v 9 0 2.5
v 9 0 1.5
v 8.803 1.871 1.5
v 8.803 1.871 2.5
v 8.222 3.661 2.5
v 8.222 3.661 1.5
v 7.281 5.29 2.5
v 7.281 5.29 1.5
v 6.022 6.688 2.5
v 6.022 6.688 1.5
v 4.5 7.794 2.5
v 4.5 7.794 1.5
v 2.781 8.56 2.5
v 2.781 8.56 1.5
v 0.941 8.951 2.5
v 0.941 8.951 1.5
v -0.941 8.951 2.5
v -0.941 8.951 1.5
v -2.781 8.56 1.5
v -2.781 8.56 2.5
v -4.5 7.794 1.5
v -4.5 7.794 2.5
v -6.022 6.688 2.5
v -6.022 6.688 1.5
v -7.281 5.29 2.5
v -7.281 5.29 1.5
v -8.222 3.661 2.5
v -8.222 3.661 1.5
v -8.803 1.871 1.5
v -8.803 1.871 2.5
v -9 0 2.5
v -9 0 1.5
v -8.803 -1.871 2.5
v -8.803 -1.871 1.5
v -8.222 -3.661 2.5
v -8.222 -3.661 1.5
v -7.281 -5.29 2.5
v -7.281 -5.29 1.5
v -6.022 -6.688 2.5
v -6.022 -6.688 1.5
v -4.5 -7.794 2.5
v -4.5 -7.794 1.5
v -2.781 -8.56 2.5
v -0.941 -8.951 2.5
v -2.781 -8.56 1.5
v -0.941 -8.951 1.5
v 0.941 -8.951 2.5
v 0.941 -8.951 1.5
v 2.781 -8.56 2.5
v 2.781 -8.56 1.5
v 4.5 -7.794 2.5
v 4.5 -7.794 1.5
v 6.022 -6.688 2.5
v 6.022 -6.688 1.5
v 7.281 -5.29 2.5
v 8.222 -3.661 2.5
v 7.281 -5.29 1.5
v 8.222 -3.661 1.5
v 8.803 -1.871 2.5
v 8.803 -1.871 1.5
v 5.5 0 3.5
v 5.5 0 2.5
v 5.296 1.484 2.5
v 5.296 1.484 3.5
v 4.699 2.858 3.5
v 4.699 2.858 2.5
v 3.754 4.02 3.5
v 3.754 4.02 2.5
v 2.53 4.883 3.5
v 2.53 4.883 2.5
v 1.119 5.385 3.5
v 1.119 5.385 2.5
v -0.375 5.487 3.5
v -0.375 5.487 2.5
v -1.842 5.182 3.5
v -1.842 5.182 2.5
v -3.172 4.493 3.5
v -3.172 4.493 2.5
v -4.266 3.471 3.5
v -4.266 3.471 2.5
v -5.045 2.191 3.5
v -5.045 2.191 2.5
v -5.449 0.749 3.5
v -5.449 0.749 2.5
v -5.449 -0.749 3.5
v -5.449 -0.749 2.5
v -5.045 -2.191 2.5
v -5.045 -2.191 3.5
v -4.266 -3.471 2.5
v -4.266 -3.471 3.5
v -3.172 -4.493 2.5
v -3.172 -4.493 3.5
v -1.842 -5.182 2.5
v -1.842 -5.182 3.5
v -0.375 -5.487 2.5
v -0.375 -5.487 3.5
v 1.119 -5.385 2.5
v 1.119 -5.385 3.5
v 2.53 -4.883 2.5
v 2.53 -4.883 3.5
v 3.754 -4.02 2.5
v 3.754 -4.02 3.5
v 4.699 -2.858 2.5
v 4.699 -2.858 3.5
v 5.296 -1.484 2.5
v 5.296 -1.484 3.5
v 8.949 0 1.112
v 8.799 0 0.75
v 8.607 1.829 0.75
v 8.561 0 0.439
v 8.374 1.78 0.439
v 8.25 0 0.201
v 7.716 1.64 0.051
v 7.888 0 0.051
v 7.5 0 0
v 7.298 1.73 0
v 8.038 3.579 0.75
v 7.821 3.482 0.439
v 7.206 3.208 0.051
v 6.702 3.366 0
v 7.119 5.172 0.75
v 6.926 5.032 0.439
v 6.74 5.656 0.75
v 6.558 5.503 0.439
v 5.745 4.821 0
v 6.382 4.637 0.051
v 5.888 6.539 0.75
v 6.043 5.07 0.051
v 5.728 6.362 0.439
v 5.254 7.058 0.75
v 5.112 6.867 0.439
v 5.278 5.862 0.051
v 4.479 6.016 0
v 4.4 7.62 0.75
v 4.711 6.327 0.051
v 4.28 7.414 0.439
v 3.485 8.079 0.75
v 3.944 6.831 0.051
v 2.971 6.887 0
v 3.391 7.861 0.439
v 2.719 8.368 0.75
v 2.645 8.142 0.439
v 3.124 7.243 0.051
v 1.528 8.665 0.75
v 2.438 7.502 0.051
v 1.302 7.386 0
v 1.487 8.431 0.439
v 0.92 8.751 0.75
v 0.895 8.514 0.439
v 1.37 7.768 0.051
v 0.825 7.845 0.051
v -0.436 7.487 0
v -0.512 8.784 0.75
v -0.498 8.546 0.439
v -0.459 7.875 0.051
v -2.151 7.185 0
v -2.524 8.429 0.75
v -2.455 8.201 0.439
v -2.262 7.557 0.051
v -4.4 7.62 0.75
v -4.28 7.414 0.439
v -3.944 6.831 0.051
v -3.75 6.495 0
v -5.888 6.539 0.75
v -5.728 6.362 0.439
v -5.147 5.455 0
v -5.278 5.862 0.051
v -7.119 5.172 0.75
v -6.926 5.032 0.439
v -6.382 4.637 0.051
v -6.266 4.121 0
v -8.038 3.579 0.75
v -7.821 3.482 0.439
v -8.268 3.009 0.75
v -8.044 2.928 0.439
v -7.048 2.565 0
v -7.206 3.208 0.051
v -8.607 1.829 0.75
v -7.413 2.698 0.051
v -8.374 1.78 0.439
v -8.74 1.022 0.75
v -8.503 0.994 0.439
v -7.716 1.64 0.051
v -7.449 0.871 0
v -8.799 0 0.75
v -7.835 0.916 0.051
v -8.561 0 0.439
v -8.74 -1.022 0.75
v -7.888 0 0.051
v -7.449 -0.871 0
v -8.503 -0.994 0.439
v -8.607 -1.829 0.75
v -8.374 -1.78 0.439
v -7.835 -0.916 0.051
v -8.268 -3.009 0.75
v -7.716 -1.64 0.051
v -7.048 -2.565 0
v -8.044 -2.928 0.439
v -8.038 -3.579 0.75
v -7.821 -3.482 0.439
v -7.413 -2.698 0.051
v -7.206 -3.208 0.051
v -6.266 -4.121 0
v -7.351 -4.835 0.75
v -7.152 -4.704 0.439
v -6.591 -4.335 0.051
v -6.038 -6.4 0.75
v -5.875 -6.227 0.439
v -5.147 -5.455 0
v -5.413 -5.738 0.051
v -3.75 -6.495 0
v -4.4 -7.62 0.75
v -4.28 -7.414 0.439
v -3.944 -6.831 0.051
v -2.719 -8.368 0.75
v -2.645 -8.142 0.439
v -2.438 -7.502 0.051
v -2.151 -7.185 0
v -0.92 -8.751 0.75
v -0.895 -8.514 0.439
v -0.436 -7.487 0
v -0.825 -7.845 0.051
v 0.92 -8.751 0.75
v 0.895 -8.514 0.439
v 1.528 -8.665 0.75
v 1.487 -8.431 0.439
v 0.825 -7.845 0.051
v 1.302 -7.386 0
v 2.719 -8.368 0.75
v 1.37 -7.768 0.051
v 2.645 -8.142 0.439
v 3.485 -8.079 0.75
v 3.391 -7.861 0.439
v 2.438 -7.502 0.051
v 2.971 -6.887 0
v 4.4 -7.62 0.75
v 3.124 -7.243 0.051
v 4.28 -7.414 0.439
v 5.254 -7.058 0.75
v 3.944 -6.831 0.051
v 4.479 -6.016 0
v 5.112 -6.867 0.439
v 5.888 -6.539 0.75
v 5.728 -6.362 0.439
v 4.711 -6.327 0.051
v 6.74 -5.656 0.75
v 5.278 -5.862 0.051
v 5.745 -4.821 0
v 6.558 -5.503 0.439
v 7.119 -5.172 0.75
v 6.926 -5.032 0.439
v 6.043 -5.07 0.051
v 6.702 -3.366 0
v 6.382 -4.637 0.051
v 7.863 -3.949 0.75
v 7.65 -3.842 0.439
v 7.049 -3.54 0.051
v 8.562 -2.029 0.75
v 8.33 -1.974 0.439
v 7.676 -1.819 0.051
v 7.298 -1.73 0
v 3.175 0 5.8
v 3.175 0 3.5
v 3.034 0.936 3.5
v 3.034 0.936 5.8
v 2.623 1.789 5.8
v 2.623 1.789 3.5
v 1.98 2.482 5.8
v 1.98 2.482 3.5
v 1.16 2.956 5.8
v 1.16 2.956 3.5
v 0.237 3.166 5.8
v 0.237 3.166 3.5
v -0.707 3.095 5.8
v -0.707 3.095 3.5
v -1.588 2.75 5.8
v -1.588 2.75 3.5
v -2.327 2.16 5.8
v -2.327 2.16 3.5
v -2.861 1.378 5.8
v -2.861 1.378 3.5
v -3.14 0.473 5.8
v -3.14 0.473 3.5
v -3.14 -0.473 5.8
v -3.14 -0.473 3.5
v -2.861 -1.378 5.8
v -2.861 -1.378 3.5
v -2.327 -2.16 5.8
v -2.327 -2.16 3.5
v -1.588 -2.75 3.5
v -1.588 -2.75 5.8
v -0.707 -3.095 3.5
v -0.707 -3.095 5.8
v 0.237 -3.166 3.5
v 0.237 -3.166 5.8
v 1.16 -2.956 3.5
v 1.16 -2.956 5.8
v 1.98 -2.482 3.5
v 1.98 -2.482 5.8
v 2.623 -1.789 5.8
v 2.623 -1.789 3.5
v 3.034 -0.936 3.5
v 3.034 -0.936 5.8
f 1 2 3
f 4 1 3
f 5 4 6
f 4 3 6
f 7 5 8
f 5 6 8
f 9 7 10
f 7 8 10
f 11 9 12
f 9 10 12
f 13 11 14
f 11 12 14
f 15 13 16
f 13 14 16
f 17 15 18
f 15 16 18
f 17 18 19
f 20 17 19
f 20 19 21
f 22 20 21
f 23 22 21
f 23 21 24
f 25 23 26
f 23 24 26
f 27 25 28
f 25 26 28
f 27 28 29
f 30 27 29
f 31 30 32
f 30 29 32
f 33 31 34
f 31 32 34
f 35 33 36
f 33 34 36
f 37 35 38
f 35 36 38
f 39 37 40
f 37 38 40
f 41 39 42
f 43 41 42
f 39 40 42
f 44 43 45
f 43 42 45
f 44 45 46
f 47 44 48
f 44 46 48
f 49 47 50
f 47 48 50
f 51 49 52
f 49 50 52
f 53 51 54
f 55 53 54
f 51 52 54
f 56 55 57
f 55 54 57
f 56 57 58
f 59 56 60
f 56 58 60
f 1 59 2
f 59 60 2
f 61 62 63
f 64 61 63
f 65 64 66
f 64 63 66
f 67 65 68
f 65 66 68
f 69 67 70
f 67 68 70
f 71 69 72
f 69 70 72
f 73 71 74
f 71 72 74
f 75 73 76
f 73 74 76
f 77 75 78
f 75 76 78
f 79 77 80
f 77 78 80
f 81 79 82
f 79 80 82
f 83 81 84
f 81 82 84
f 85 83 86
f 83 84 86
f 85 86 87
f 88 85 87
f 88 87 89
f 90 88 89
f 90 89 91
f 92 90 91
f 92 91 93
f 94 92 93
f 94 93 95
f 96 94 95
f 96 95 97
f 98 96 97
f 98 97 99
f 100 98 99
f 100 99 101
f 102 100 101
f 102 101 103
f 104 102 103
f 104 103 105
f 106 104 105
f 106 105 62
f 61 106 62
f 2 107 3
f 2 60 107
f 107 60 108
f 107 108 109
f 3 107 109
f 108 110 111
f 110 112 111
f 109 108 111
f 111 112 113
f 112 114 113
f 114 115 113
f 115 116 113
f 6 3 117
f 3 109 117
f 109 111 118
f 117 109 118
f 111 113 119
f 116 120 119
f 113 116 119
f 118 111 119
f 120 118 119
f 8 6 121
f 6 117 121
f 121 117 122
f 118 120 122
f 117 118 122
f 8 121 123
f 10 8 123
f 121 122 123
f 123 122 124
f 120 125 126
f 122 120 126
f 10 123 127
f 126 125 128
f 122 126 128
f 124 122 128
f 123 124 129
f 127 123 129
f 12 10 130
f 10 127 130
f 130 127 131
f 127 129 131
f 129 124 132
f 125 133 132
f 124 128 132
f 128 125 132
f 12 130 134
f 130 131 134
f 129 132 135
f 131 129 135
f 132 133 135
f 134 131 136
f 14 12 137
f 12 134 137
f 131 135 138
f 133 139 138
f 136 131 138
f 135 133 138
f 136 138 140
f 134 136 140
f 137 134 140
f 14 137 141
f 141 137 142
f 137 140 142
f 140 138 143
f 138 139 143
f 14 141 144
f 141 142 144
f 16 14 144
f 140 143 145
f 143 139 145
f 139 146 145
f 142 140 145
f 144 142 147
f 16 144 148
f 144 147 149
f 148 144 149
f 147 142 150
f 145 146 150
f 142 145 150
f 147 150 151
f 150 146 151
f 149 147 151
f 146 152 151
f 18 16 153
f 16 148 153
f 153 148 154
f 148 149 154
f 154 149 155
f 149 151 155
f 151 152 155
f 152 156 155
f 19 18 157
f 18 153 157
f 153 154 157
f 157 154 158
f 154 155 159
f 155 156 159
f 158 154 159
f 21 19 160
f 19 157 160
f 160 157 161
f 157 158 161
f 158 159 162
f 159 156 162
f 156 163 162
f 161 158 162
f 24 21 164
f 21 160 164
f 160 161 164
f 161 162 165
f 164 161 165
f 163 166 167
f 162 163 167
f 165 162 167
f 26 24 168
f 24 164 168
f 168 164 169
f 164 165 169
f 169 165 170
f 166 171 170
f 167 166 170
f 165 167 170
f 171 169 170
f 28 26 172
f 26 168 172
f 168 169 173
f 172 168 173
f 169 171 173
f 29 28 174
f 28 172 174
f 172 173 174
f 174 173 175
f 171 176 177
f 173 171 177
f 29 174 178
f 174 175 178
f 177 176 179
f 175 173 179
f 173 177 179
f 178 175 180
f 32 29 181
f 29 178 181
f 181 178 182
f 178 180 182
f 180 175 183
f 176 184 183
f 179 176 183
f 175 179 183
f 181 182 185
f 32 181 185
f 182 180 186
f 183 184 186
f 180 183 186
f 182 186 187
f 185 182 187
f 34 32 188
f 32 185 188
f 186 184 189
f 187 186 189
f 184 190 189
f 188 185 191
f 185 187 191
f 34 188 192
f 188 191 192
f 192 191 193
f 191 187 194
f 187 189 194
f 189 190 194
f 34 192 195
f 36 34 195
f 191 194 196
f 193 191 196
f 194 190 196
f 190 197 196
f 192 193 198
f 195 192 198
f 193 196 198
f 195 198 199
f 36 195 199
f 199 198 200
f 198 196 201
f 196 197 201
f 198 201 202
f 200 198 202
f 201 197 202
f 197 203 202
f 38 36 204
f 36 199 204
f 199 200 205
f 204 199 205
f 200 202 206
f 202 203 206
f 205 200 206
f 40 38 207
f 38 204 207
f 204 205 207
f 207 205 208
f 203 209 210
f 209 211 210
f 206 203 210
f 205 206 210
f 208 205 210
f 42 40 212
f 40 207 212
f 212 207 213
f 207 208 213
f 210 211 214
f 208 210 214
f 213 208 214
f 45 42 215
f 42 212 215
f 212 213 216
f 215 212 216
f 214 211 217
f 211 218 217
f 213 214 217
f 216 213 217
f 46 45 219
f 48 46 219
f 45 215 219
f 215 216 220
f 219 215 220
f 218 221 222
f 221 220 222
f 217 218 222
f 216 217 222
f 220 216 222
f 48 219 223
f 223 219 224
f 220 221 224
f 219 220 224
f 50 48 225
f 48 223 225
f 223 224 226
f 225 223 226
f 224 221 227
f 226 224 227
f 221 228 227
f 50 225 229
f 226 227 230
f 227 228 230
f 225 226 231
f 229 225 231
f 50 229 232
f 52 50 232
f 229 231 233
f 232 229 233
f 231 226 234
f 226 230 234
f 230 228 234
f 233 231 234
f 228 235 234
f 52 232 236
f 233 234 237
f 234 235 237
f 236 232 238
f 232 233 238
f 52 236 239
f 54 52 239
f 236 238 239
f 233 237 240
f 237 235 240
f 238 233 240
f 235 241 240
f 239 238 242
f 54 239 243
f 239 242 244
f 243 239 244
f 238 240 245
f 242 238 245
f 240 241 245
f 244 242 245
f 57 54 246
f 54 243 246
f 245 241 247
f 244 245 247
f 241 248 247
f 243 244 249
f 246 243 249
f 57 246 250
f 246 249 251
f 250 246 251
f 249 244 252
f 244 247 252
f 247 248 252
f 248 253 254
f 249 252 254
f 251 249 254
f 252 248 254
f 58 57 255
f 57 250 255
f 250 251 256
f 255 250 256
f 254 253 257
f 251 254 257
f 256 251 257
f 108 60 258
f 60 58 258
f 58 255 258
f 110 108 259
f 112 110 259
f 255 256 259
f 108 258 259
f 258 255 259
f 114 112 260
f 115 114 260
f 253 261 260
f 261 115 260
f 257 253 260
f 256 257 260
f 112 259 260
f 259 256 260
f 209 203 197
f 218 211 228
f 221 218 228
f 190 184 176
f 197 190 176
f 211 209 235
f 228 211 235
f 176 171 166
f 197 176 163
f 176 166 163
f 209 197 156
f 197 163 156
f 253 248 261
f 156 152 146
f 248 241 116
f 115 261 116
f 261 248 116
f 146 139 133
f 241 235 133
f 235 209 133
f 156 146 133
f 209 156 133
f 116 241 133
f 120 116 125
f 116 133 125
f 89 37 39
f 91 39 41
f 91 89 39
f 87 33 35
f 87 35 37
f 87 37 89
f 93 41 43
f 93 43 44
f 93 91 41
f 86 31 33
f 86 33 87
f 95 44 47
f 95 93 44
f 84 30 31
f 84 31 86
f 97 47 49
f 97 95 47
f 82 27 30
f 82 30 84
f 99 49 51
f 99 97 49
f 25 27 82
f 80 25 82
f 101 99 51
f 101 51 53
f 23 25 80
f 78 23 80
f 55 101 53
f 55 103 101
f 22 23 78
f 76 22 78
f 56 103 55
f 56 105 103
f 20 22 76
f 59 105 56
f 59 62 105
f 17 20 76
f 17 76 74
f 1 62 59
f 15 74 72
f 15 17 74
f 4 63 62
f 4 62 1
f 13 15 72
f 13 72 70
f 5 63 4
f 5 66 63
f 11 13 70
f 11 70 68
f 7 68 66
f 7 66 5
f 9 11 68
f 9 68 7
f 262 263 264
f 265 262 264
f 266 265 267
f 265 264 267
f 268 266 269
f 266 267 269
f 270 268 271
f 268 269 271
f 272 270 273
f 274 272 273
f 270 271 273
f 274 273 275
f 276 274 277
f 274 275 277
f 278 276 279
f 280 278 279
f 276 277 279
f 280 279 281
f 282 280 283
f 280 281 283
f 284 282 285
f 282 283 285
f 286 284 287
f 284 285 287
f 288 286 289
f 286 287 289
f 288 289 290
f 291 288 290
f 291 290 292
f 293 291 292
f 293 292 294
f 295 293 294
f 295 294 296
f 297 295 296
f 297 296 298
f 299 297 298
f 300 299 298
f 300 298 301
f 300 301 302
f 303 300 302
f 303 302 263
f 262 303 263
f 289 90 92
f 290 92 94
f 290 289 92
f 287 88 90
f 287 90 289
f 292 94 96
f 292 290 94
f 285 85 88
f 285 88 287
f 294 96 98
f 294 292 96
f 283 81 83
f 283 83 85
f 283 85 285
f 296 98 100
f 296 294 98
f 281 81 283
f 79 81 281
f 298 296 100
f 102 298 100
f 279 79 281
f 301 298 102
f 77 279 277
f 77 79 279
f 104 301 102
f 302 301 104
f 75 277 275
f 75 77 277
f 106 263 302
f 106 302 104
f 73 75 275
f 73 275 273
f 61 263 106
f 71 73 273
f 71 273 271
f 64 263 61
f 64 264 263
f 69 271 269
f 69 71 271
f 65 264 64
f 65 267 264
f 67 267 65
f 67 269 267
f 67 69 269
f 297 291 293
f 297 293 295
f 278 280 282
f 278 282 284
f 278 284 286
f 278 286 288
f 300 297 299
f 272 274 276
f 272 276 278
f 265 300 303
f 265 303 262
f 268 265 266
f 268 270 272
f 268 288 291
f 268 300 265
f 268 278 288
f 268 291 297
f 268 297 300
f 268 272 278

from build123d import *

# Parameters (mm, degrees)
F0_R     = 9
F0_R_2   = 5.5
F1_DEPTH = 2.5
F0_R_3   = 3.175
F2_DEPTH = 3.5
F3_DEPTH = 5.8
F4_R     = 1.5


with BuildPart() as f1:
    # F0 (on Top) → F1 (new body)
    with BuildSketch(Plane.XY):
        Circle(F0_R)
        Circle(F0_R_2, mode=Mode.SUBTRACT)
    extrude(amount=F1_DEPTH)

    # F0 (on Top) → F2 (join, through all)
    with BuildSketch(Plane.XY):
        Circle(F0_R_2)
        Circle(F0_R_3, mode=Mode.SUBTRACT)
    extrude(amount=F2_DEPTH)

    # F0 (on Top) → F3 (join, through all)
    with BuildSketch(Plane.XY):
        Circle(F0_R_3)
    extrude(amount=F3_DEPTH)

    # F4
    f4_edges = [f1.edges().sort_by_distance(p)[0] for p in [
        (-9, 0, 0),
    ]]
    fillet(f4_edges, radius=F4_R)


solid = f1.part
